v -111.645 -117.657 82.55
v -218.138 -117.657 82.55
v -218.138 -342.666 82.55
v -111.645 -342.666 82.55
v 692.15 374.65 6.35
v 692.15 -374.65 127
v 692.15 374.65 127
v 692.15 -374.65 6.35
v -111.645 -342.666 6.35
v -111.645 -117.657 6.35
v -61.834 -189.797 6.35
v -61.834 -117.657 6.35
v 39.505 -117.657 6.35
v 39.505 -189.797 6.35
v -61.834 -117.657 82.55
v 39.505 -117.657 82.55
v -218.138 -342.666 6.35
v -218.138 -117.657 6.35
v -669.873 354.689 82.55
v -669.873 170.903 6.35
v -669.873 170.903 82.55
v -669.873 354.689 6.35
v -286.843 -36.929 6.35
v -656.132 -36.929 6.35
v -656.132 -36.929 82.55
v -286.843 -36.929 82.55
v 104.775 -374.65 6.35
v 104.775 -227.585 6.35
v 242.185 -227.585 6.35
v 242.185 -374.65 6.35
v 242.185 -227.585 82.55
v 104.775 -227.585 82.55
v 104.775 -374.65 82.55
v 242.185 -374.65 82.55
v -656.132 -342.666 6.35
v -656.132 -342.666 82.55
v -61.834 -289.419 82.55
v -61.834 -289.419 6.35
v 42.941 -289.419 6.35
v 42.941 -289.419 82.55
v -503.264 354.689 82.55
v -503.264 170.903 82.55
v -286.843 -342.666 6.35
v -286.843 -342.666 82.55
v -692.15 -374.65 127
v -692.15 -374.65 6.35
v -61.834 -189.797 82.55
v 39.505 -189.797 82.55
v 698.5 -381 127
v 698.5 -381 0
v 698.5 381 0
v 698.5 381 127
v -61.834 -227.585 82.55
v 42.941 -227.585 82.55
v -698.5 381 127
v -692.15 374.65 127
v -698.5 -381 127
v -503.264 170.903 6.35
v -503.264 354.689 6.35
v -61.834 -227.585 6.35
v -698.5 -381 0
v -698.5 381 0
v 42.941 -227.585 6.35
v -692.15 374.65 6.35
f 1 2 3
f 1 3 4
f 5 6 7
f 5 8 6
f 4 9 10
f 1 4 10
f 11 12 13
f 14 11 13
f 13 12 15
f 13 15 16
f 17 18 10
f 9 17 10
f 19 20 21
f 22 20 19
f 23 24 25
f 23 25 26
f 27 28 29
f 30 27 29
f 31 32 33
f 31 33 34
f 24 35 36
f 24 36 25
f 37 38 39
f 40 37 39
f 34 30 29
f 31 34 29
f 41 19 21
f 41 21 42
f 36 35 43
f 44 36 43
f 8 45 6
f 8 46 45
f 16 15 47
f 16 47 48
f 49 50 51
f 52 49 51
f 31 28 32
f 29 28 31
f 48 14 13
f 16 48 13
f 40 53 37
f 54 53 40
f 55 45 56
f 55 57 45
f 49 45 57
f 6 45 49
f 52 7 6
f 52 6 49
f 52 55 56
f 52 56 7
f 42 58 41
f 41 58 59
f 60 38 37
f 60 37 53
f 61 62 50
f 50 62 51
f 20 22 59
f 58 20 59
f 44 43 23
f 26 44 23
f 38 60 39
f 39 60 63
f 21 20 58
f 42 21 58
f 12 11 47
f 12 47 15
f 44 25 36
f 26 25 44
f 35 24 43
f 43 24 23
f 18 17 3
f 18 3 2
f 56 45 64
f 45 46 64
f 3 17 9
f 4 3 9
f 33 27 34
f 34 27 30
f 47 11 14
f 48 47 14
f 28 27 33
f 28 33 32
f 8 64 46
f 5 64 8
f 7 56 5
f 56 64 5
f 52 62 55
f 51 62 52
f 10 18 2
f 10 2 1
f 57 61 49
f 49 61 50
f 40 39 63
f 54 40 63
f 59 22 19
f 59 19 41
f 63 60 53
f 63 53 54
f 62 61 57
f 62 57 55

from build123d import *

# Parameters (mm, degrees)
F0_W     = 1397
F0_H     = 762
F1_DEPTH = 127
F2_T     = -6.35
F3_W     = 369.288891
F3_H     = 305.73687
F3_W_2   = 106.492617
F3_H_2   = 225.008592
F3_W_3   = 101.339743
F3_H_3   = 72.140157
F3_W_4   = 104.774971
F3_H_4   = 61.834409
F3_W_5   = 166.609407
F3_H_5   = 183.785647
F3_W_6   = 137.409859
F3_H_6   = 147.064967
F4_DEPTH = 76.2


with BuildPart() as f1:
    # F0 (on Top) → F1 (new body)
    with BuildSketch(Plane.XY):
        Rectangle(F0_W, F0_H)
    extrude(amount=F1_DEPTH)

    # F2
    f2_openings = [f1.faces().sort_by_distance(p)[0] for p in [
        (0, 0, 127),
    ]]
    offset(amount=F2_T, openings=f2_openings)


with BuildPart() as f4:
    # F3 (on face) → F4 (new body)
    with BuildSketch(Plane.XY.offset(6.35)):
        with Locations((-471.487477, -189.797327)):
            Rectangle(F3_W, F3_H)
        with Locations((-164.89179, -230.161466)):
            Rectangle(F3_W_2, F3_H_2)
        with Locations((-11.164538, -153.727249)):
            Rectangle(F3_W_3, F3_H_3)
        with Locations((-9.446925, -258.502237)):
            Rectangle(F3_W_4, F3_H_4)
        with Locations((-586.568237, 262.796297)):
            Rectangle(F3_W_5, F3_H_5)
        with Locations((173.479918, -301.117516)):
            Rectangle(F3_W_6, F3_H_6)
    extrude(amount=F4_DEPTH)


solid = Compound([f1.part, f4.part])
